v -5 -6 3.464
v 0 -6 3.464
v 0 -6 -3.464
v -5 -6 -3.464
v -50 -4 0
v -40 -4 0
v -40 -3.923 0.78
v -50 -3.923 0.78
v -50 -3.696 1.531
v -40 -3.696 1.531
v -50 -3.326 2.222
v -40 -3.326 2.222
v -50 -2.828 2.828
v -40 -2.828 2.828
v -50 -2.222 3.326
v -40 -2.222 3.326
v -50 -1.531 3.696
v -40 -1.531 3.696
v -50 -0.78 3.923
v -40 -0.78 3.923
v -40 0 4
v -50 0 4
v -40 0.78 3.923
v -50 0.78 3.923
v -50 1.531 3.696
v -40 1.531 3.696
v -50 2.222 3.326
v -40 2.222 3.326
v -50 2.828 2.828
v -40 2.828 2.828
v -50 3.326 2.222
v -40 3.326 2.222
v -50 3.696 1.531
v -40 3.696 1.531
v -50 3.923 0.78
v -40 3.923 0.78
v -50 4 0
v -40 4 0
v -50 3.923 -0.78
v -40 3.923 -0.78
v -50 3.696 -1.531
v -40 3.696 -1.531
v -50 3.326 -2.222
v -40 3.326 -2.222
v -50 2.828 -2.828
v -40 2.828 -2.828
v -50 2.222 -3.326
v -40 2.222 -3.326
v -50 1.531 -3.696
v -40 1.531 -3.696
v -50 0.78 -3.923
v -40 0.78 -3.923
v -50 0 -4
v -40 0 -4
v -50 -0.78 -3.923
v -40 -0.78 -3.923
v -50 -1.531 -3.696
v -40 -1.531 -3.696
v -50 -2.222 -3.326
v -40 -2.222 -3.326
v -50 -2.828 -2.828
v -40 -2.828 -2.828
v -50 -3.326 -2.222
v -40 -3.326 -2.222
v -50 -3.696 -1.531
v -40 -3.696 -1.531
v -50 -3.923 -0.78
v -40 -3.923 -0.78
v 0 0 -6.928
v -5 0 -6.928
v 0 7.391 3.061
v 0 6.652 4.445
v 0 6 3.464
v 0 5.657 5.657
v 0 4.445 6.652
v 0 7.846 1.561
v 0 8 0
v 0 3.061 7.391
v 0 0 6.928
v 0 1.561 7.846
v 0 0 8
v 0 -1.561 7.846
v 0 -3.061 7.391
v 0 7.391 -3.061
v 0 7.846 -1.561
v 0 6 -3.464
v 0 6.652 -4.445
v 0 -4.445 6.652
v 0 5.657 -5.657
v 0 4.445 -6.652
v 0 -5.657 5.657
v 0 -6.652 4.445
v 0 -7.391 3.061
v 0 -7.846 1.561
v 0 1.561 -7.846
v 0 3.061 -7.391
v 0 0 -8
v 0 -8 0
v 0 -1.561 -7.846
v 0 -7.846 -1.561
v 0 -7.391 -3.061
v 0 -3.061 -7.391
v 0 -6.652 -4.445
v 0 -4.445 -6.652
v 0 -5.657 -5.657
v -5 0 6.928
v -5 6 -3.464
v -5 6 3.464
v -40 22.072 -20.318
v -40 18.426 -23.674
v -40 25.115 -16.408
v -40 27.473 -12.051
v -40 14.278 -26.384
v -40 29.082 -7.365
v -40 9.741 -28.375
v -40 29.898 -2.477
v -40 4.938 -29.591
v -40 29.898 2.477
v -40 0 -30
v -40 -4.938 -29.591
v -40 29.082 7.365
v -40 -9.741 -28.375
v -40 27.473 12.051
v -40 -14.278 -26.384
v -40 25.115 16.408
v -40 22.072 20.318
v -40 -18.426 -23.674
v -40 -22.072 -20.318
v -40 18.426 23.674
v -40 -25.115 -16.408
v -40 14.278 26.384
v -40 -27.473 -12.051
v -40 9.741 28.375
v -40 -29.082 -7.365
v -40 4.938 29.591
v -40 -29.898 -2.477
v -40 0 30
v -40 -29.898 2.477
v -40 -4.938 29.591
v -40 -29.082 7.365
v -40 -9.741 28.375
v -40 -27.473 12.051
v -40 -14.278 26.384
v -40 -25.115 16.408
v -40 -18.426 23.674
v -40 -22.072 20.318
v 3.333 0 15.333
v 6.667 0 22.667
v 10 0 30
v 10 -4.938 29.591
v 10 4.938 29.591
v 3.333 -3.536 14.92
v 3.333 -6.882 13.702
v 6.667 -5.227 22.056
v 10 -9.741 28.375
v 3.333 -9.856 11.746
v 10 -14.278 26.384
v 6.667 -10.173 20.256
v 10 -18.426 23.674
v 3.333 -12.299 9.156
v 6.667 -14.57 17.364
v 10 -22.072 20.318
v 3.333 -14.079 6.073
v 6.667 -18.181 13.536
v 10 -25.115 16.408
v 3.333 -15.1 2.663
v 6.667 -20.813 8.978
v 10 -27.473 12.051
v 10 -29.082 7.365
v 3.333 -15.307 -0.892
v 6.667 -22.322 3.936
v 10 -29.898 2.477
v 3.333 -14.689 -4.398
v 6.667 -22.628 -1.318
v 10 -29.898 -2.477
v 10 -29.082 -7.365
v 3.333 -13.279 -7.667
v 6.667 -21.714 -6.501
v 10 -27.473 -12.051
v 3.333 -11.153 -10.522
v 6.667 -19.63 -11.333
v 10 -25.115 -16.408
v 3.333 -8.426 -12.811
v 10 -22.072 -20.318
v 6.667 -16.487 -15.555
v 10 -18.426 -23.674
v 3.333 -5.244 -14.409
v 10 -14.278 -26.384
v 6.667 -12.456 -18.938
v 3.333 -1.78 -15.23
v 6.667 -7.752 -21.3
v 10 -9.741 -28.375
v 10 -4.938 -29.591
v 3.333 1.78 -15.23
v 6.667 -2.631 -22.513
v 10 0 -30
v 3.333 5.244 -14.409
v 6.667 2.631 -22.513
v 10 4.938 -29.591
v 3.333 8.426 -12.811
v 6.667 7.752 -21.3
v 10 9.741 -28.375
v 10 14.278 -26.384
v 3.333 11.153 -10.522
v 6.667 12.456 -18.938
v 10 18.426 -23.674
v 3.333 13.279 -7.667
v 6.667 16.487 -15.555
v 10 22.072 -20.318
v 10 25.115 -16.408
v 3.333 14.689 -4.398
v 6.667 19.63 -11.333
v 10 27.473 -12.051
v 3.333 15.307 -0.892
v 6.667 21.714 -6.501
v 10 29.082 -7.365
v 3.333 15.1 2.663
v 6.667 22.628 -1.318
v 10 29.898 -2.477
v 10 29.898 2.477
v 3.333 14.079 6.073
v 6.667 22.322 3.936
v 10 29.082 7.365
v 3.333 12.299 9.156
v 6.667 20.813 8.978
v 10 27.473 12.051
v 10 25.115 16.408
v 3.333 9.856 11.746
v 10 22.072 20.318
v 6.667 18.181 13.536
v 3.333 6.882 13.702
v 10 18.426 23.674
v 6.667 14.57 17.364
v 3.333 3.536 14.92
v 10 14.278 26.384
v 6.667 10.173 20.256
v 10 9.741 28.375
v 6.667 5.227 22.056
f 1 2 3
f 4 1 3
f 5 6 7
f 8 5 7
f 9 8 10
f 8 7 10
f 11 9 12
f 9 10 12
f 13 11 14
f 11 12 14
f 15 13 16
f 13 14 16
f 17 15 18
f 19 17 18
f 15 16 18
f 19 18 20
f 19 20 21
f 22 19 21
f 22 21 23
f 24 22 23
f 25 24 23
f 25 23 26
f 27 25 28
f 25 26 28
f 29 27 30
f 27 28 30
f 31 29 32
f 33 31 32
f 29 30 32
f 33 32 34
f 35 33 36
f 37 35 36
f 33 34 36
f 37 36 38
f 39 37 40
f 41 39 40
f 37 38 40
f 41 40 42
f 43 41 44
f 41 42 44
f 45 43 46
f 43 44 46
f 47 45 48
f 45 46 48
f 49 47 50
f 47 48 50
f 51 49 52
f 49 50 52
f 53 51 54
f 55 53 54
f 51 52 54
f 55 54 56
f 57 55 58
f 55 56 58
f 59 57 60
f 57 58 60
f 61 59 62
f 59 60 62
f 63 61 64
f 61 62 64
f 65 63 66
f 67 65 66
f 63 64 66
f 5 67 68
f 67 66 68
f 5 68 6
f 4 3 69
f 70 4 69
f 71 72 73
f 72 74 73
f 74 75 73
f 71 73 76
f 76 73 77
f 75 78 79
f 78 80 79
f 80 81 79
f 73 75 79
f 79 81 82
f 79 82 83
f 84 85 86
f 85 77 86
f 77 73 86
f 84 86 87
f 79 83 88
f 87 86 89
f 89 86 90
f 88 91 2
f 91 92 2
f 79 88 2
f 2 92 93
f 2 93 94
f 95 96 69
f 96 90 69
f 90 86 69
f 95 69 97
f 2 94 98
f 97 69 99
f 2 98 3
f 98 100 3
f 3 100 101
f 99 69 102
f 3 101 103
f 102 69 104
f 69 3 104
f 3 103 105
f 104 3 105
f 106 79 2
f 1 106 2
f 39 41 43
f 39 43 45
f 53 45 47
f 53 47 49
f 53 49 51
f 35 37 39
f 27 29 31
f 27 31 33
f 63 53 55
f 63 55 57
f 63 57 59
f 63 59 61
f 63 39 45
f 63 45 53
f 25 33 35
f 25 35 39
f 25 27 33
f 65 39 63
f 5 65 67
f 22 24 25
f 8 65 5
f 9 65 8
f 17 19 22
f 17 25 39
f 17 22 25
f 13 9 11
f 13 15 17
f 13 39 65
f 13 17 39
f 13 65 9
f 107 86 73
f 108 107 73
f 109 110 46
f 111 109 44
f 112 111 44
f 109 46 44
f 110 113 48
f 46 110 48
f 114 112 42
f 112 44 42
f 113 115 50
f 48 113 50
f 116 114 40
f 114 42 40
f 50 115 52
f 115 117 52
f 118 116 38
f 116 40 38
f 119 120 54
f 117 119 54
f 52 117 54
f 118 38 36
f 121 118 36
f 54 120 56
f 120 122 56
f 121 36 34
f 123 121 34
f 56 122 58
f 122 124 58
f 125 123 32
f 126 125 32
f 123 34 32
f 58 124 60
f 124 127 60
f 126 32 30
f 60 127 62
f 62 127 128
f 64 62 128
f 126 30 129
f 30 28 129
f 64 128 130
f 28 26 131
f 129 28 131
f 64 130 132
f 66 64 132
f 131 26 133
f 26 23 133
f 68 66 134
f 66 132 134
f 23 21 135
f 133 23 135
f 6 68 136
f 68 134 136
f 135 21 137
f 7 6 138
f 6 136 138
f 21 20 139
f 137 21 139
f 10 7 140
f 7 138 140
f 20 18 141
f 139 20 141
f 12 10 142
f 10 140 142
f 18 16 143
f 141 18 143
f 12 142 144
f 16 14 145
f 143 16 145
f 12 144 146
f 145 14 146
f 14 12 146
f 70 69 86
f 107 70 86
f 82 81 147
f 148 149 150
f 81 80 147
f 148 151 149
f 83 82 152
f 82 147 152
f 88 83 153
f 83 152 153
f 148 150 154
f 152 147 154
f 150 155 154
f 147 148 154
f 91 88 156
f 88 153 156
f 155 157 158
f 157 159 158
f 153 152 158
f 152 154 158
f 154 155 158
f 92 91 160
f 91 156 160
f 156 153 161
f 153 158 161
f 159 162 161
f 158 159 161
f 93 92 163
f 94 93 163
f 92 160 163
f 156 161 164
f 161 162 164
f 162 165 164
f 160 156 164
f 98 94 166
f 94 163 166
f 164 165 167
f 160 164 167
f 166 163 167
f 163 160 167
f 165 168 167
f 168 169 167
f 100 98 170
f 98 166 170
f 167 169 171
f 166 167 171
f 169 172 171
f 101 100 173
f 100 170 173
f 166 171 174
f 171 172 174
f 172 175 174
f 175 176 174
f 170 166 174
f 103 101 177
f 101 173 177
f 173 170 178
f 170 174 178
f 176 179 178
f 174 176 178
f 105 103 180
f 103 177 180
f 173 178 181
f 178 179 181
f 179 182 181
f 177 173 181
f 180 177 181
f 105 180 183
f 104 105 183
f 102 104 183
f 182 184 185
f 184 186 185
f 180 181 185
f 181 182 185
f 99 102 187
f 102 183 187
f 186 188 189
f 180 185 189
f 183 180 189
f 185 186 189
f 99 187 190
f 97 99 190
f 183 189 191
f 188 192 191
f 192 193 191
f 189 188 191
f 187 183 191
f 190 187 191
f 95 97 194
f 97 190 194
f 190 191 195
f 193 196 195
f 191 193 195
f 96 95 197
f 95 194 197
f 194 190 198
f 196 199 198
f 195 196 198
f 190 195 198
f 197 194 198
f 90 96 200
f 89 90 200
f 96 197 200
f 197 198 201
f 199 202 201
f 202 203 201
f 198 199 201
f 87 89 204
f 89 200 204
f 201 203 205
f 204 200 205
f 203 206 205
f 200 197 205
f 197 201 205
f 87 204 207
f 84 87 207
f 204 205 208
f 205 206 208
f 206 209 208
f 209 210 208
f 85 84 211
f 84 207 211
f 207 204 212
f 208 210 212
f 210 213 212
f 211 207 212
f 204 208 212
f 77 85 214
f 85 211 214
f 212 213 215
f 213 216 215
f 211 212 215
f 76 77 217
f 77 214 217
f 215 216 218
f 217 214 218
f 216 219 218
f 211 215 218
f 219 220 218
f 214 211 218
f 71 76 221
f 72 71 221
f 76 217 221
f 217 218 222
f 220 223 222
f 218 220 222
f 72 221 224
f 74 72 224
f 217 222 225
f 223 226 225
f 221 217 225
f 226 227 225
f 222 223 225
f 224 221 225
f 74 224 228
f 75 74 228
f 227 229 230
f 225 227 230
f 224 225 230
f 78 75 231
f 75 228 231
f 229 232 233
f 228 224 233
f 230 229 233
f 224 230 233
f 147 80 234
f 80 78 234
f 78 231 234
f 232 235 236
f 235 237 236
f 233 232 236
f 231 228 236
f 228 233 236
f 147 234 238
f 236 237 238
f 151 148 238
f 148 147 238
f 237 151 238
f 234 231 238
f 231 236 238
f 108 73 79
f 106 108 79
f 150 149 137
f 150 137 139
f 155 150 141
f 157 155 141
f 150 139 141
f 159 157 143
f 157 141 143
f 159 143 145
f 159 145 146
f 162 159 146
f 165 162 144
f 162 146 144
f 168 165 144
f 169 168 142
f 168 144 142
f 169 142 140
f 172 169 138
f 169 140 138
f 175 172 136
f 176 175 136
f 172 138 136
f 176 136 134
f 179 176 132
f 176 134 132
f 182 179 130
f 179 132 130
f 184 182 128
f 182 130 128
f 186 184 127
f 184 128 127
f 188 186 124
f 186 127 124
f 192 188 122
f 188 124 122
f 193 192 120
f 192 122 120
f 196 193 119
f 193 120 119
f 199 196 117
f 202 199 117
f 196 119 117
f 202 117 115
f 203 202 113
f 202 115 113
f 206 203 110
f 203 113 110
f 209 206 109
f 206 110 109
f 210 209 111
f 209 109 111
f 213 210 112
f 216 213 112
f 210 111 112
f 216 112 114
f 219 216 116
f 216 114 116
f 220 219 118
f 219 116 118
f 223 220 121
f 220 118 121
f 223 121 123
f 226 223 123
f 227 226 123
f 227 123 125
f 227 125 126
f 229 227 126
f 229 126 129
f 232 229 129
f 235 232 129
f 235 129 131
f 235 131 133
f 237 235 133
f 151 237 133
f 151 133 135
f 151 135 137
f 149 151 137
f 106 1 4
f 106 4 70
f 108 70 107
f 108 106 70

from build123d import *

# Parameters (mm, degrees)
F3_DEPTH = 5
F4_R     = 4
F5_DEPTH = 10


with BuildPart() as f1:
    # F0 (on Front) → F1 (revolve)
    with BuildSketch(Plane.XZ):
        Polygon((10, 30), (-40, 30), (-40, 0), (0, 0), (0, 8), align=None)
    revolve(axis=Axis((-2.905972, 0, 0), (1, 0, 0)))

    # F2 (on face) → F3 (cut)
    with BuildSketch(Plane.YZ):
        Polygon((0, -6.928203), (6, -3.464102), (6, 3.464102), (0, 6.928203), (-6, 3.464102), (-6, -3.464102), align=None)
    extrude(amount=-F3_DEPTH, mode=Mode.SUBTRACT)

    # F4 (on face) → F5 (join)
    with BuildSketch(Plane(origin=(-40, 0, 0), x_dir=(0, -1, 0), z_dir=(-1, 0, 0))):
        Circle(F4_R)
    extrude(amount=F5_DEPTH)


solid = f1.part
